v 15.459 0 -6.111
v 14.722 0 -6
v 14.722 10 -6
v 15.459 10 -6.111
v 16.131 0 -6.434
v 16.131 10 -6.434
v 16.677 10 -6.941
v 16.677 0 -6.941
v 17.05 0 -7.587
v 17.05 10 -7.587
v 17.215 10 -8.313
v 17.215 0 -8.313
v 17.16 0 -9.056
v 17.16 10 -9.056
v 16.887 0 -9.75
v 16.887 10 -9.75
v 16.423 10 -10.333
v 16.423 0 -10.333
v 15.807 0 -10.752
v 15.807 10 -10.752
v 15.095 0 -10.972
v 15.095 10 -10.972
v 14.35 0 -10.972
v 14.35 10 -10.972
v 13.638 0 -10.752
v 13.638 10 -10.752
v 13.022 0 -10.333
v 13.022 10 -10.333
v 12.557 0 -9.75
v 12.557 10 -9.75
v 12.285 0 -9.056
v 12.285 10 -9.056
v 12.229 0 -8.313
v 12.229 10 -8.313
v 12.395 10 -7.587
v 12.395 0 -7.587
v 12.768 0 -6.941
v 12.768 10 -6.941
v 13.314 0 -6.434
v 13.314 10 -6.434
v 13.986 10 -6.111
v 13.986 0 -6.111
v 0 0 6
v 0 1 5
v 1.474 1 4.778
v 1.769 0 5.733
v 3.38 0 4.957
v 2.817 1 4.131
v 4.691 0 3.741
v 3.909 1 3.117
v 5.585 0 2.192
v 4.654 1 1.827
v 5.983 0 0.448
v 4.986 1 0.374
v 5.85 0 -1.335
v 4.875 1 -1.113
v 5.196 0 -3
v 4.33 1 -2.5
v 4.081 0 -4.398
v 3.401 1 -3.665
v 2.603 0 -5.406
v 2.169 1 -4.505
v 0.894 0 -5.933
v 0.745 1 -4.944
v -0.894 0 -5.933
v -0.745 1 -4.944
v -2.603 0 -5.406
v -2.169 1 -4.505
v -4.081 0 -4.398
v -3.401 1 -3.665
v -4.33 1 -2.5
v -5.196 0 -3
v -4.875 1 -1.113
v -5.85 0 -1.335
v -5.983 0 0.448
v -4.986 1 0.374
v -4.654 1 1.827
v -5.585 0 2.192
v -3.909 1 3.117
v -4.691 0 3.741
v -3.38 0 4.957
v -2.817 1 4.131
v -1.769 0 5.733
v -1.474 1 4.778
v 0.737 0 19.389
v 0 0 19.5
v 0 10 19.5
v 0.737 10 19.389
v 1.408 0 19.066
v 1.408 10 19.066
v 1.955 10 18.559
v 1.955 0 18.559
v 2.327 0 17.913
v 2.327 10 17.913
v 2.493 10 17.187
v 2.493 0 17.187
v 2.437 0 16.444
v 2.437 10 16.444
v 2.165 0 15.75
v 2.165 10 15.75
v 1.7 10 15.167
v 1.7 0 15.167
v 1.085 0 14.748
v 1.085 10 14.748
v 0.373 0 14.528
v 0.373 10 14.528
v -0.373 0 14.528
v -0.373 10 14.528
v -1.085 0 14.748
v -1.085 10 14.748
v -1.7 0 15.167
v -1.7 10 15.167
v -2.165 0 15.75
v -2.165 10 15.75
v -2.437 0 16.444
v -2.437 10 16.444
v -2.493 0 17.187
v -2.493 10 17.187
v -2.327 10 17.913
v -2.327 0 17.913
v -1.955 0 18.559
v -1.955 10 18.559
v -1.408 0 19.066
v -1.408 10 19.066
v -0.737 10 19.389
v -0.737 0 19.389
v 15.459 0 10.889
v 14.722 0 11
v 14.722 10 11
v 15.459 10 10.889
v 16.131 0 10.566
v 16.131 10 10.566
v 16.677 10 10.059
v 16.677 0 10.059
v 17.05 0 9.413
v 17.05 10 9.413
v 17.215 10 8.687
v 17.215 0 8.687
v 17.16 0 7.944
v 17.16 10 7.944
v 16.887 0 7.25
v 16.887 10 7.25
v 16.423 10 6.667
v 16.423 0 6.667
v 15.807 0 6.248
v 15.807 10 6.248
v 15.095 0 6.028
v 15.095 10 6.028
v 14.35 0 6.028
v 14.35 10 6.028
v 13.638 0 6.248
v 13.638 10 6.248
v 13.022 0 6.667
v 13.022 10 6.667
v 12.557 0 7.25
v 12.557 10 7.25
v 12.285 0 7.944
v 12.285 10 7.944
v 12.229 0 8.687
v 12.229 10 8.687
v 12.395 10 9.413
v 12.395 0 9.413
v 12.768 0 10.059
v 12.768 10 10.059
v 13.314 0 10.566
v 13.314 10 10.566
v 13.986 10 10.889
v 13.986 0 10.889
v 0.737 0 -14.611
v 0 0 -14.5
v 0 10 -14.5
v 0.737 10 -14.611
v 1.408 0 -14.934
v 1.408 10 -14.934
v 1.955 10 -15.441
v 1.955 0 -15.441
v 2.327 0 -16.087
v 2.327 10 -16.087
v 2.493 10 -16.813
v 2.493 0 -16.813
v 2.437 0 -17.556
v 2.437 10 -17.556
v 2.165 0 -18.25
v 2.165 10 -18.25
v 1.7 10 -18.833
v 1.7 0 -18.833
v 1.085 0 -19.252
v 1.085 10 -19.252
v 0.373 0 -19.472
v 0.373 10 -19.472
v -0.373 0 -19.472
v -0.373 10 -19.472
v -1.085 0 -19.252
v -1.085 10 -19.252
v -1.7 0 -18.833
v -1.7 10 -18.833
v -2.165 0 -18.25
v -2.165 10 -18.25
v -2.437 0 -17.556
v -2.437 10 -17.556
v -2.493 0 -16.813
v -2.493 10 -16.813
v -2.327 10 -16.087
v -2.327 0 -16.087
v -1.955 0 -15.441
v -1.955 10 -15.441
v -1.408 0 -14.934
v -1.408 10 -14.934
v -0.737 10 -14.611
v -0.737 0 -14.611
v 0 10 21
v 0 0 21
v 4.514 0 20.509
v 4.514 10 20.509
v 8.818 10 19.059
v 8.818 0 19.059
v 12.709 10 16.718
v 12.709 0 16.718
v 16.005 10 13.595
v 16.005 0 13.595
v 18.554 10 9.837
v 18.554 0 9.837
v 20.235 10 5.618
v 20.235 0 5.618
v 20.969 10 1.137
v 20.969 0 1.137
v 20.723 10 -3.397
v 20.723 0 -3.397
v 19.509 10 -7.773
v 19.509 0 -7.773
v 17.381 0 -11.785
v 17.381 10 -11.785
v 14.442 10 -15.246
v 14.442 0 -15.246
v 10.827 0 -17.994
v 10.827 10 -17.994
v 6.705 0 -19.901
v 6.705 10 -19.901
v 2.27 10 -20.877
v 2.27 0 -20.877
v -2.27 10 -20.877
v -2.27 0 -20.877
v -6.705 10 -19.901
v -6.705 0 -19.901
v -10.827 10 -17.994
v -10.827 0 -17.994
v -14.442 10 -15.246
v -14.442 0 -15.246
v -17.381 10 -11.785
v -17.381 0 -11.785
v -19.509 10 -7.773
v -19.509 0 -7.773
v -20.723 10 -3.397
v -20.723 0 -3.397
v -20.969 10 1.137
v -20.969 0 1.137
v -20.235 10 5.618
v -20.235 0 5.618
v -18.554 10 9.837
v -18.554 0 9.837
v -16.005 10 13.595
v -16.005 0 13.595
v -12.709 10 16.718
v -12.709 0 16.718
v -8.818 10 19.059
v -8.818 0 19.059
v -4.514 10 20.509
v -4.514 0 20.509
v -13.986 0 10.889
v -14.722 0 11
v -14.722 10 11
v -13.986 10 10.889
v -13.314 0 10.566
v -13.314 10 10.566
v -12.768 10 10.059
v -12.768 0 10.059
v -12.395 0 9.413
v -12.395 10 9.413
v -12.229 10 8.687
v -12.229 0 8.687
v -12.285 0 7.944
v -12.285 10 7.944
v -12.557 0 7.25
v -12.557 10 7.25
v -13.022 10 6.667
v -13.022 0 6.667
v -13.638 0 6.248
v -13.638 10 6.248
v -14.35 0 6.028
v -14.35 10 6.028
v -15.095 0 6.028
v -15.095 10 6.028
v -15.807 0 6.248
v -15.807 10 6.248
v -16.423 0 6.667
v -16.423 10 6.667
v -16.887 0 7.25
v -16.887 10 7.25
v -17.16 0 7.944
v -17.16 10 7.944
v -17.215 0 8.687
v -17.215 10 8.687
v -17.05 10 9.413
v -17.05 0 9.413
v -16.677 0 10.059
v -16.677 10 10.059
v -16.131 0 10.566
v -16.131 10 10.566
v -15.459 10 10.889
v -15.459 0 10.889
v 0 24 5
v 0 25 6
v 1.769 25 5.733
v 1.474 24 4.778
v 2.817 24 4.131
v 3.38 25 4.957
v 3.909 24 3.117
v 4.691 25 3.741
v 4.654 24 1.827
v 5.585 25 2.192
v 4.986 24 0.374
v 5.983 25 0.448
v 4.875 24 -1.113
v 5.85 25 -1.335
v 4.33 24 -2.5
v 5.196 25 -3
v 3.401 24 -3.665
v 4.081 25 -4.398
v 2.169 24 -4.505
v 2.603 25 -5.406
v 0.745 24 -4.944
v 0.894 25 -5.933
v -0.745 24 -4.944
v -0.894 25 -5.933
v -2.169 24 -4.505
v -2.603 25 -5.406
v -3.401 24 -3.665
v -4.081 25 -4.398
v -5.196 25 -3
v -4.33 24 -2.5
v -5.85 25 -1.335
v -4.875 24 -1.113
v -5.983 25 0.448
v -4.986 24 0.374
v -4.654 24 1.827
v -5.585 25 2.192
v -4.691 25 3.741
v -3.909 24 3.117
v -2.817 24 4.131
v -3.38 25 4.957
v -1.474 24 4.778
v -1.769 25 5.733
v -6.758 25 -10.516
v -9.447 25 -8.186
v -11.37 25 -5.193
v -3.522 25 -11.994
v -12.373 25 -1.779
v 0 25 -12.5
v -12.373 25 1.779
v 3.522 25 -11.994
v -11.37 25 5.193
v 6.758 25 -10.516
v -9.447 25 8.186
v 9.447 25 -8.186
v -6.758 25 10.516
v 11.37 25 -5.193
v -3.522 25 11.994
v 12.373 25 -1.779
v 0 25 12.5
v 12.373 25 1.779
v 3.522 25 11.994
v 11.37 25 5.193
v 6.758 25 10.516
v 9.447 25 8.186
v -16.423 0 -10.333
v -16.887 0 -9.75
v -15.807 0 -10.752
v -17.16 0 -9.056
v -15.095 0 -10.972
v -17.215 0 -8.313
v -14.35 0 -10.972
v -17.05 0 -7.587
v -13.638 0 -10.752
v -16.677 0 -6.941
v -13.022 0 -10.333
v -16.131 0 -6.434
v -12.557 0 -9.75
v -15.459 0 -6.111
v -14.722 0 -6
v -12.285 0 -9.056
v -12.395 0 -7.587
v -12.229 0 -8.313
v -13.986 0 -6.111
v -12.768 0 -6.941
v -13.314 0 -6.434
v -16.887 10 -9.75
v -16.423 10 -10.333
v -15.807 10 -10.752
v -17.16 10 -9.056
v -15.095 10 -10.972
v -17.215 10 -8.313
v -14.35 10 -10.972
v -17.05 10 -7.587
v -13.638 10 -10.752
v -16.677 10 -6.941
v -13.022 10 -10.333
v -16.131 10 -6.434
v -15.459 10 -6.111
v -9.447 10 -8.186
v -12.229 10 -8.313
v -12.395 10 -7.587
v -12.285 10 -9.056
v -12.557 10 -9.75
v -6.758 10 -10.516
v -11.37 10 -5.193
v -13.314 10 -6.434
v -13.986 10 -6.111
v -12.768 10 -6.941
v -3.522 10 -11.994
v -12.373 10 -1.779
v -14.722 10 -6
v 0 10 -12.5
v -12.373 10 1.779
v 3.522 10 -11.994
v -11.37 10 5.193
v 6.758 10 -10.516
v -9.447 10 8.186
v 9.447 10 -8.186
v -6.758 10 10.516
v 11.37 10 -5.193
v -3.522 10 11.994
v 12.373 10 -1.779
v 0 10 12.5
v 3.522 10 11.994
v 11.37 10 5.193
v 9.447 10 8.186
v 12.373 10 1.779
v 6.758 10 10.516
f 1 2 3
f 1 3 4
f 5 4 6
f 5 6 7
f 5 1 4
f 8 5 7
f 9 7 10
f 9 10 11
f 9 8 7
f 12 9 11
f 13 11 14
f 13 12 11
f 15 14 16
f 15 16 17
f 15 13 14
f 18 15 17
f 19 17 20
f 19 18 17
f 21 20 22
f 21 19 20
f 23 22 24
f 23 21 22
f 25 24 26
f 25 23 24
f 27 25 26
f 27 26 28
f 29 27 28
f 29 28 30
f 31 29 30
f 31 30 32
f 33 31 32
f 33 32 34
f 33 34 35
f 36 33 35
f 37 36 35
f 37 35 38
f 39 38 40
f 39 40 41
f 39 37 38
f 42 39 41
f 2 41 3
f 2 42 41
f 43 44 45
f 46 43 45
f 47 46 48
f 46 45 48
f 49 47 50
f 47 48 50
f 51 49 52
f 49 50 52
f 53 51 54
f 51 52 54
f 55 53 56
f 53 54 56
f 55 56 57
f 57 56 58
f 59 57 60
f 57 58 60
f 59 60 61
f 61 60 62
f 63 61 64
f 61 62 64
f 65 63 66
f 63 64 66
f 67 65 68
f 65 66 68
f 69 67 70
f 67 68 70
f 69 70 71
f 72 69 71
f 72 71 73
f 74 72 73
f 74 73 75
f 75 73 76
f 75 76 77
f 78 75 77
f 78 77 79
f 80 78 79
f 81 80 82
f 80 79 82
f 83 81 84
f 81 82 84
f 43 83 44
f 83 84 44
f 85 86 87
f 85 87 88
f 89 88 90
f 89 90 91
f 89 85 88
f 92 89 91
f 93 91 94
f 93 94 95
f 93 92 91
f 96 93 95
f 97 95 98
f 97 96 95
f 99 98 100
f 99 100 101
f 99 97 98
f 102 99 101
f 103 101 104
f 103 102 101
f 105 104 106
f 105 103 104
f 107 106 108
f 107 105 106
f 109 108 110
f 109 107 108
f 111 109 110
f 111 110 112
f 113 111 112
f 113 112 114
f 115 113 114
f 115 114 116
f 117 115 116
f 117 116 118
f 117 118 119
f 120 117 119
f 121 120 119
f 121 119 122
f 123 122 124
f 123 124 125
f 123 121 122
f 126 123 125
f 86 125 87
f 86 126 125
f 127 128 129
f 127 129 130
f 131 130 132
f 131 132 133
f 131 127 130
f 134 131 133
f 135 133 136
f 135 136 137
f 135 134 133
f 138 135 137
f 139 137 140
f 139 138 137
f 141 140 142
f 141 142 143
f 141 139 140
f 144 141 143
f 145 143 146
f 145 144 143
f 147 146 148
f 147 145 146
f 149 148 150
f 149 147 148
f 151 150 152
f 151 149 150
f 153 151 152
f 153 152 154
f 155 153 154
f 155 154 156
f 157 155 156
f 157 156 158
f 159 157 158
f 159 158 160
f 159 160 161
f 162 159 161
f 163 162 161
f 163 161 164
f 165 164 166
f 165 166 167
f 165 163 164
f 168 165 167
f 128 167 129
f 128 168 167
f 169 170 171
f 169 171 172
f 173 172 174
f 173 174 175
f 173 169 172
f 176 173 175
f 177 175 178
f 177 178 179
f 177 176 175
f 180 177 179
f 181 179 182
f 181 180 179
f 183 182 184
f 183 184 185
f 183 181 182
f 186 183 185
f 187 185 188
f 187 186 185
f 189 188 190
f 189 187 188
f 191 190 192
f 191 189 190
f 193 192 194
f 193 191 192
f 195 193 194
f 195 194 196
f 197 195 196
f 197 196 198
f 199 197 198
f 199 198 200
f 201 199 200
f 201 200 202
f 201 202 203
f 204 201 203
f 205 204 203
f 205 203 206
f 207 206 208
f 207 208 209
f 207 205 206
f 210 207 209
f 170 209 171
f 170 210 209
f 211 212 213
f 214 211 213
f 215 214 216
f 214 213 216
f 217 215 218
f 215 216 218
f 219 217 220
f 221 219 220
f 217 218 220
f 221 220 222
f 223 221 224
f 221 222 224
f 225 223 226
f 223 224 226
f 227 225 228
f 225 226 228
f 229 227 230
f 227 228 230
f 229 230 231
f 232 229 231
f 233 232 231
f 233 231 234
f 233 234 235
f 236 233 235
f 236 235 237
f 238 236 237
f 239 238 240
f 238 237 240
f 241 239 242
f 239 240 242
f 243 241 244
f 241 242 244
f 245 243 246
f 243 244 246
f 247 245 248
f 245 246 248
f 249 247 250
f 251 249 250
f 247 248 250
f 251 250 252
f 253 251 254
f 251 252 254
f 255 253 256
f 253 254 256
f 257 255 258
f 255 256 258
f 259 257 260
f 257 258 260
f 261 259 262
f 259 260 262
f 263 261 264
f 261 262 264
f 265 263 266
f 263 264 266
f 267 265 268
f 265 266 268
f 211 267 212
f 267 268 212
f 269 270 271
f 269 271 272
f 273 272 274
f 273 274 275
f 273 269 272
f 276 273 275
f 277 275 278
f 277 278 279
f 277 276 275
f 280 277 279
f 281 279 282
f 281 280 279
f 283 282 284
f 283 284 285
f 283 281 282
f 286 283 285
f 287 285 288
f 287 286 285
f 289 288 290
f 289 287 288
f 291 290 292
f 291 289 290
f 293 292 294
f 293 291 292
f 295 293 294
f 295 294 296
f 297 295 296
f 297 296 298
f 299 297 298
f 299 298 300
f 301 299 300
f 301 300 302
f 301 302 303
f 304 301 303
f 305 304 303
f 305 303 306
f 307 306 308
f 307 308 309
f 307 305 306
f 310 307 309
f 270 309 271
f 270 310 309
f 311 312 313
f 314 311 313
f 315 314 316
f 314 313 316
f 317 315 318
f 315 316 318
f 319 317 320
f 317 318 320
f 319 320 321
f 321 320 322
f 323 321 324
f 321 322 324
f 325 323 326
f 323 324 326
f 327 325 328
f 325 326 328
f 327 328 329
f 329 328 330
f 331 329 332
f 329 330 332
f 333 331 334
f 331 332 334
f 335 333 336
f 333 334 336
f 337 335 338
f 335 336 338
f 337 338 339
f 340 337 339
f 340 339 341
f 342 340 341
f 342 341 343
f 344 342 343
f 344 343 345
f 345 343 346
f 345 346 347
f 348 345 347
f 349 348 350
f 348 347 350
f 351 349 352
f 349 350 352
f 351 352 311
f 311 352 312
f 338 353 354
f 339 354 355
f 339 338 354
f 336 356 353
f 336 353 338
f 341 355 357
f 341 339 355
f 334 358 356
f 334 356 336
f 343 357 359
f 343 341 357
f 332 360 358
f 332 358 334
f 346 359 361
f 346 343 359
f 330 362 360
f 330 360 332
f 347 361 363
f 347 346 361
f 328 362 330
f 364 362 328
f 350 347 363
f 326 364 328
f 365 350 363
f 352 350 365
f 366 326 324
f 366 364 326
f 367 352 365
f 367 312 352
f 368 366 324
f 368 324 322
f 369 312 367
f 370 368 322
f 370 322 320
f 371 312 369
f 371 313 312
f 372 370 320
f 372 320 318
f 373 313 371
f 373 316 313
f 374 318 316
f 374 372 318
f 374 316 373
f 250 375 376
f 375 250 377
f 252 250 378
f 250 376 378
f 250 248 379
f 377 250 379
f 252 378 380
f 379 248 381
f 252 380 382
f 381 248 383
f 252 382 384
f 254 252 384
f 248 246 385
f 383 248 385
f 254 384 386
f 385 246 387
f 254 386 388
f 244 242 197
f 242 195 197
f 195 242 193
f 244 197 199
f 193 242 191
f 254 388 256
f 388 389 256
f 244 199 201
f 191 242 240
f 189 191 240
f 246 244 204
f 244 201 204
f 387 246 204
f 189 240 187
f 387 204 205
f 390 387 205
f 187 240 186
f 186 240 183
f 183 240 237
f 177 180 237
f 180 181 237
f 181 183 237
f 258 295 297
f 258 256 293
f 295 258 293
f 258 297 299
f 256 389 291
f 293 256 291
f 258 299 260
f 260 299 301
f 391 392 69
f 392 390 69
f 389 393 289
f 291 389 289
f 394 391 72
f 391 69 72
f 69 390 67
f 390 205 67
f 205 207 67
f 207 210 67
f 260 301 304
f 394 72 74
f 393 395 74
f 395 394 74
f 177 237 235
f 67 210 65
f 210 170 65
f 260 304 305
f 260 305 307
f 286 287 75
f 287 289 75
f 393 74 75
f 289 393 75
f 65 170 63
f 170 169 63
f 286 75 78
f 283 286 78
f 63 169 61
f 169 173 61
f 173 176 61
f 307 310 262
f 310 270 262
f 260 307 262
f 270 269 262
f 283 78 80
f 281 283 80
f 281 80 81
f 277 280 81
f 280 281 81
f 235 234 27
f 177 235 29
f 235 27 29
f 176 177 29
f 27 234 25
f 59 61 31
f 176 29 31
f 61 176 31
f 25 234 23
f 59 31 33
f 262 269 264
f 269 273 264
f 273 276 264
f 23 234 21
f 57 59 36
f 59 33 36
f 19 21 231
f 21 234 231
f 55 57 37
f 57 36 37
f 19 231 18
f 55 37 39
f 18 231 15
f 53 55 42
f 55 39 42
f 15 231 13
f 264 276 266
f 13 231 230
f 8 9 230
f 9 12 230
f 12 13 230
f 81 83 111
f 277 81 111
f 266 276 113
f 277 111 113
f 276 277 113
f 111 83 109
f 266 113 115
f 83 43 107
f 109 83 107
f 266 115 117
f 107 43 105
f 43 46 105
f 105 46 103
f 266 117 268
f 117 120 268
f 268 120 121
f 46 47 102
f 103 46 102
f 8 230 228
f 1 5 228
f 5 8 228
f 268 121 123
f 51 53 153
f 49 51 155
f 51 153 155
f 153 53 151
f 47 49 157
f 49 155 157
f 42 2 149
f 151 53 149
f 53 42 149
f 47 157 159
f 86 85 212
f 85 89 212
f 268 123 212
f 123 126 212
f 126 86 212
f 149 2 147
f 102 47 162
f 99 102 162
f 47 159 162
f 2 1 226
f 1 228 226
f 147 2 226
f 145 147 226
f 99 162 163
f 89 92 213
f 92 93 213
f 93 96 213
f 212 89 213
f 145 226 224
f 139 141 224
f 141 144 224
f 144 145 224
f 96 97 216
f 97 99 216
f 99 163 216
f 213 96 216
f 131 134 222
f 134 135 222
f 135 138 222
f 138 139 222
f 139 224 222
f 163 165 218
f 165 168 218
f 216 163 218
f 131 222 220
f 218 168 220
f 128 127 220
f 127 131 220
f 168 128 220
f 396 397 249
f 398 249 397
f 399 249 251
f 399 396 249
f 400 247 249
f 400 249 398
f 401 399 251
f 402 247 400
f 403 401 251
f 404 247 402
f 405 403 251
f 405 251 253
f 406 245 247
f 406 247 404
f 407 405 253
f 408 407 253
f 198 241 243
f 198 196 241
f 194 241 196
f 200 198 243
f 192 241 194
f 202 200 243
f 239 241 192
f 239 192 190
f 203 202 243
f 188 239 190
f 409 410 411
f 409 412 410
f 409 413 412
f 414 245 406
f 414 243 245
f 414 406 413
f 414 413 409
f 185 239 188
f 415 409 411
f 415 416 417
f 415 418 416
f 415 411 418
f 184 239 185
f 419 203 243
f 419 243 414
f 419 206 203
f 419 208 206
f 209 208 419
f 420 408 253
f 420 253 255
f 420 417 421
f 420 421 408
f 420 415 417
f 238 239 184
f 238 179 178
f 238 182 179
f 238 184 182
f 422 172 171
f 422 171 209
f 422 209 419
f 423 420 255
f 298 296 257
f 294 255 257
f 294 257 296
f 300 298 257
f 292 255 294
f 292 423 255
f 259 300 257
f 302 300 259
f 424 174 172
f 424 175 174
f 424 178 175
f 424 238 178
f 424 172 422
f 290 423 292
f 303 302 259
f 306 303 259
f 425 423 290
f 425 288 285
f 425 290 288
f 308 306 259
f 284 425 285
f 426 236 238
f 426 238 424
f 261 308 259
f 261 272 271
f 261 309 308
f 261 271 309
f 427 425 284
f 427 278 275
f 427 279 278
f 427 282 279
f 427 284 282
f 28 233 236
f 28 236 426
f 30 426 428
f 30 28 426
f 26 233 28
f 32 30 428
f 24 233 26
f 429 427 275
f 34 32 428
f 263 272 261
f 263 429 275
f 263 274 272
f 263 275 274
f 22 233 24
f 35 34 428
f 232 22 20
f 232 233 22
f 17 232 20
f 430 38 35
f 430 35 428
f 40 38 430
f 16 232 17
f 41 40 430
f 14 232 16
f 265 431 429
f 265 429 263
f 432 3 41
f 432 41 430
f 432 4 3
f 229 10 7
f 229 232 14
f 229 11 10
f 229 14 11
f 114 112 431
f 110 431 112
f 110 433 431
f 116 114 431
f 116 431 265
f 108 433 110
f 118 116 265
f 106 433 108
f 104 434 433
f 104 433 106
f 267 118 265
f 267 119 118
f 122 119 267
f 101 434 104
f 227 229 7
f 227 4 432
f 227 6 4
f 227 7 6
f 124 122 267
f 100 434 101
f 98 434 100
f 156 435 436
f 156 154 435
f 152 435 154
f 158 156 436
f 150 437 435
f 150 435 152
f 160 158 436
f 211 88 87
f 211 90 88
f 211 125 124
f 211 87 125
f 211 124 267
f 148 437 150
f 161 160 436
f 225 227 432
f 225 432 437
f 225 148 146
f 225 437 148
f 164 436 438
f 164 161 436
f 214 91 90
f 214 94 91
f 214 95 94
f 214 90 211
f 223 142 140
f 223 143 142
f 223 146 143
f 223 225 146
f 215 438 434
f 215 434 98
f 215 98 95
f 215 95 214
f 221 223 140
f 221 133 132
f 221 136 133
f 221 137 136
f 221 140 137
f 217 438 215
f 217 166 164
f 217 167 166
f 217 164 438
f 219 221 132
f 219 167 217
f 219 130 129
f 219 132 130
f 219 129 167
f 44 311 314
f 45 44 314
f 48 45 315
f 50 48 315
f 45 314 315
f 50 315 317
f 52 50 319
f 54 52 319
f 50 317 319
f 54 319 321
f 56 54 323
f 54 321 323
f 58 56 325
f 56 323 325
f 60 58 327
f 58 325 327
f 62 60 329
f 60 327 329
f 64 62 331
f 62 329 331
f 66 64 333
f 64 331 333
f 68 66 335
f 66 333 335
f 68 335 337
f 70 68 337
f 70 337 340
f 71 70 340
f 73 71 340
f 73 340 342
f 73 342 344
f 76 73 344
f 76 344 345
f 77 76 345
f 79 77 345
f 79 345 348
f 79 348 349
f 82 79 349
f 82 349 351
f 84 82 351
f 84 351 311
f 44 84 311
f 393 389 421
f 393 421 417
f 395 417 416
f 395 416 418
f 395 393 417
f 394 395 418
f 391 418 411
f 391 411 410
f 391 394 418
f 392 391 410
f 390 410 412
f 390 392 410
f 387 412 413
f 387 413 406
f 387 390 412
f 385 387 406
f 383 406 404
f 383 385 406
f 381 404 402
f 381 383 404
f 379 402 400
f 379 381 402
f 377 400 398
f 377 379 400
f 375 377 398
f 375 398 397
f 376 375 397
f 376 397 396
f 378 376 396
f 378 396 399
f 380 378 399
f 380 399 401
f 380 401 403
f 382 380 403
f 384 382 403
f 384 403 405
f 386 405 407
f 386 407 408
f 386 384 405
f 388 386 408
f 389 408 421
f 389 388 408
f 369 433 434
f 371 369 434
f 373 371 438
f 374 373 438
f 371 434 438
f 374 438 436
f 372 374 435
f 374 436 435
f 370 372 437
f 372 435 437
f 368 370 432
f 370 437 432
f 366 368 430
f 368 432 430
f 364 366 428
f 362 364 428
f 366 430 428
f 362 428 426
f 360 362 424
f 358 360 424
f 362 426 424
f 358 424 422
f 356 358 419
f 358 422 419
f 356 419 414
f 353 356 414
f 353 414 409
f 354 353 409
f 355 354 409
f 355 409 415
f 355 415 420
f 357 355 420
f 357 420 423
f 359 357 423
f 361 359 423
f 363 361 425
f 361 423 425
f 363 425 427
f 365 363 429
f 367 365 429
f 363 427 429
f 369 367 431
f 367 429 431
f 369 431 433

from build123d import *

# Parameters (mm, degrees)
SKETCH1_R           = 21
SKETCH1_R_2         = 2.5
BOSS_EXTRUDE1_DEPTH = 10
SKETCH2_R           = 12.5
BOSS_EXTRUDE2_DEPTH = 15
SKETCH3_R           = 5
CUT_EXTRUDE1_DEPTH  = 39.820097888
CHAMFER1_SIZE       = 1


with BuildPart() as part:
    # Sketch1 → Boss-Extrude1 (new body)
    with BuildSketch(Plane(origin=(0, 0, 0), x_dir=(1, 0, 0), z_dir=(0, 1, 0))):
        with Locations(Location((0, 0, 0), (0, 0, 270))):
            Circle(SKETCH1_R)
        with Locations(Location((0, 17, 0), (0, 0, 270))):
            Circle(SKETCH1_R_2, mode=Mode.SUBTRACT)
        with Locations(Location((14.722431864, 8.5, 0), (0, 0, 270))):
            Circle(SKETCH1_R_2, mode=Mode.SUBTRACT)
        with Locations(Location((14.722431864, -8.5, 0), (0, 0, 270))):
            Circle(SKETCH1_R_2, mode=Mode.SUBTRACT)
        with Locations(Location((0, -17, 0), (0, 0, 270))):
            Circle(SKETCH1_R_2, mode=Mode.SUBTRACT)
        with Locations(Location((-14.722431864, -8.5, 0), (0, 0, 270))):
            Circle(SKETCH1_R_2, mode=Mode.SUBTRACT)
        with Locations(Location((-14.722431864, 8.5, 0), (0, 0, 270))):
            Circle(SKETCH1_R_2, mode=Mode.SUBTRACT)
    extrude(amount=BOSS_EXTRUDE1_DEPTH)

    # Sketch2 → Boss-Extrude2 (add)
    with BuildSketch(Plane(origin=(0, 10, 0), x_dir=(1, 0, 0), z_dir=(0, 1, 0))):
        with Locations(Location((0, 0, 0), (0, 0, 270))):
            Circle(SKETCH2_R)
    extrude(amount=BOSS_EXTRUDE2_DEPTH)

    # Sketch3 → Cut-Extrude1 (cut, through all)
    with BuildSketch(Plane(origin=(0, 25, 0), x_dir=(1, 0, 0), z_dir=(0, 1, 0))):
        with Locations(Location((0, 0, 0), (0, 0, 270))):
            Circle(SKETCH3_R)
    extrude(amount=-CUT_EXTRUDE1_DEPTH, mode=Mode.SUBTRACT)

    # Chamfer1
    chamfer1_edges = [part.edges().sort_by_distance(p)[0] for p in [
        (0, 0, -5),
        (0, 25, -5),
    ]]
    chamfer(chamfer1_edges, length=CHAMFER1_SIZE)


solid = part.part
